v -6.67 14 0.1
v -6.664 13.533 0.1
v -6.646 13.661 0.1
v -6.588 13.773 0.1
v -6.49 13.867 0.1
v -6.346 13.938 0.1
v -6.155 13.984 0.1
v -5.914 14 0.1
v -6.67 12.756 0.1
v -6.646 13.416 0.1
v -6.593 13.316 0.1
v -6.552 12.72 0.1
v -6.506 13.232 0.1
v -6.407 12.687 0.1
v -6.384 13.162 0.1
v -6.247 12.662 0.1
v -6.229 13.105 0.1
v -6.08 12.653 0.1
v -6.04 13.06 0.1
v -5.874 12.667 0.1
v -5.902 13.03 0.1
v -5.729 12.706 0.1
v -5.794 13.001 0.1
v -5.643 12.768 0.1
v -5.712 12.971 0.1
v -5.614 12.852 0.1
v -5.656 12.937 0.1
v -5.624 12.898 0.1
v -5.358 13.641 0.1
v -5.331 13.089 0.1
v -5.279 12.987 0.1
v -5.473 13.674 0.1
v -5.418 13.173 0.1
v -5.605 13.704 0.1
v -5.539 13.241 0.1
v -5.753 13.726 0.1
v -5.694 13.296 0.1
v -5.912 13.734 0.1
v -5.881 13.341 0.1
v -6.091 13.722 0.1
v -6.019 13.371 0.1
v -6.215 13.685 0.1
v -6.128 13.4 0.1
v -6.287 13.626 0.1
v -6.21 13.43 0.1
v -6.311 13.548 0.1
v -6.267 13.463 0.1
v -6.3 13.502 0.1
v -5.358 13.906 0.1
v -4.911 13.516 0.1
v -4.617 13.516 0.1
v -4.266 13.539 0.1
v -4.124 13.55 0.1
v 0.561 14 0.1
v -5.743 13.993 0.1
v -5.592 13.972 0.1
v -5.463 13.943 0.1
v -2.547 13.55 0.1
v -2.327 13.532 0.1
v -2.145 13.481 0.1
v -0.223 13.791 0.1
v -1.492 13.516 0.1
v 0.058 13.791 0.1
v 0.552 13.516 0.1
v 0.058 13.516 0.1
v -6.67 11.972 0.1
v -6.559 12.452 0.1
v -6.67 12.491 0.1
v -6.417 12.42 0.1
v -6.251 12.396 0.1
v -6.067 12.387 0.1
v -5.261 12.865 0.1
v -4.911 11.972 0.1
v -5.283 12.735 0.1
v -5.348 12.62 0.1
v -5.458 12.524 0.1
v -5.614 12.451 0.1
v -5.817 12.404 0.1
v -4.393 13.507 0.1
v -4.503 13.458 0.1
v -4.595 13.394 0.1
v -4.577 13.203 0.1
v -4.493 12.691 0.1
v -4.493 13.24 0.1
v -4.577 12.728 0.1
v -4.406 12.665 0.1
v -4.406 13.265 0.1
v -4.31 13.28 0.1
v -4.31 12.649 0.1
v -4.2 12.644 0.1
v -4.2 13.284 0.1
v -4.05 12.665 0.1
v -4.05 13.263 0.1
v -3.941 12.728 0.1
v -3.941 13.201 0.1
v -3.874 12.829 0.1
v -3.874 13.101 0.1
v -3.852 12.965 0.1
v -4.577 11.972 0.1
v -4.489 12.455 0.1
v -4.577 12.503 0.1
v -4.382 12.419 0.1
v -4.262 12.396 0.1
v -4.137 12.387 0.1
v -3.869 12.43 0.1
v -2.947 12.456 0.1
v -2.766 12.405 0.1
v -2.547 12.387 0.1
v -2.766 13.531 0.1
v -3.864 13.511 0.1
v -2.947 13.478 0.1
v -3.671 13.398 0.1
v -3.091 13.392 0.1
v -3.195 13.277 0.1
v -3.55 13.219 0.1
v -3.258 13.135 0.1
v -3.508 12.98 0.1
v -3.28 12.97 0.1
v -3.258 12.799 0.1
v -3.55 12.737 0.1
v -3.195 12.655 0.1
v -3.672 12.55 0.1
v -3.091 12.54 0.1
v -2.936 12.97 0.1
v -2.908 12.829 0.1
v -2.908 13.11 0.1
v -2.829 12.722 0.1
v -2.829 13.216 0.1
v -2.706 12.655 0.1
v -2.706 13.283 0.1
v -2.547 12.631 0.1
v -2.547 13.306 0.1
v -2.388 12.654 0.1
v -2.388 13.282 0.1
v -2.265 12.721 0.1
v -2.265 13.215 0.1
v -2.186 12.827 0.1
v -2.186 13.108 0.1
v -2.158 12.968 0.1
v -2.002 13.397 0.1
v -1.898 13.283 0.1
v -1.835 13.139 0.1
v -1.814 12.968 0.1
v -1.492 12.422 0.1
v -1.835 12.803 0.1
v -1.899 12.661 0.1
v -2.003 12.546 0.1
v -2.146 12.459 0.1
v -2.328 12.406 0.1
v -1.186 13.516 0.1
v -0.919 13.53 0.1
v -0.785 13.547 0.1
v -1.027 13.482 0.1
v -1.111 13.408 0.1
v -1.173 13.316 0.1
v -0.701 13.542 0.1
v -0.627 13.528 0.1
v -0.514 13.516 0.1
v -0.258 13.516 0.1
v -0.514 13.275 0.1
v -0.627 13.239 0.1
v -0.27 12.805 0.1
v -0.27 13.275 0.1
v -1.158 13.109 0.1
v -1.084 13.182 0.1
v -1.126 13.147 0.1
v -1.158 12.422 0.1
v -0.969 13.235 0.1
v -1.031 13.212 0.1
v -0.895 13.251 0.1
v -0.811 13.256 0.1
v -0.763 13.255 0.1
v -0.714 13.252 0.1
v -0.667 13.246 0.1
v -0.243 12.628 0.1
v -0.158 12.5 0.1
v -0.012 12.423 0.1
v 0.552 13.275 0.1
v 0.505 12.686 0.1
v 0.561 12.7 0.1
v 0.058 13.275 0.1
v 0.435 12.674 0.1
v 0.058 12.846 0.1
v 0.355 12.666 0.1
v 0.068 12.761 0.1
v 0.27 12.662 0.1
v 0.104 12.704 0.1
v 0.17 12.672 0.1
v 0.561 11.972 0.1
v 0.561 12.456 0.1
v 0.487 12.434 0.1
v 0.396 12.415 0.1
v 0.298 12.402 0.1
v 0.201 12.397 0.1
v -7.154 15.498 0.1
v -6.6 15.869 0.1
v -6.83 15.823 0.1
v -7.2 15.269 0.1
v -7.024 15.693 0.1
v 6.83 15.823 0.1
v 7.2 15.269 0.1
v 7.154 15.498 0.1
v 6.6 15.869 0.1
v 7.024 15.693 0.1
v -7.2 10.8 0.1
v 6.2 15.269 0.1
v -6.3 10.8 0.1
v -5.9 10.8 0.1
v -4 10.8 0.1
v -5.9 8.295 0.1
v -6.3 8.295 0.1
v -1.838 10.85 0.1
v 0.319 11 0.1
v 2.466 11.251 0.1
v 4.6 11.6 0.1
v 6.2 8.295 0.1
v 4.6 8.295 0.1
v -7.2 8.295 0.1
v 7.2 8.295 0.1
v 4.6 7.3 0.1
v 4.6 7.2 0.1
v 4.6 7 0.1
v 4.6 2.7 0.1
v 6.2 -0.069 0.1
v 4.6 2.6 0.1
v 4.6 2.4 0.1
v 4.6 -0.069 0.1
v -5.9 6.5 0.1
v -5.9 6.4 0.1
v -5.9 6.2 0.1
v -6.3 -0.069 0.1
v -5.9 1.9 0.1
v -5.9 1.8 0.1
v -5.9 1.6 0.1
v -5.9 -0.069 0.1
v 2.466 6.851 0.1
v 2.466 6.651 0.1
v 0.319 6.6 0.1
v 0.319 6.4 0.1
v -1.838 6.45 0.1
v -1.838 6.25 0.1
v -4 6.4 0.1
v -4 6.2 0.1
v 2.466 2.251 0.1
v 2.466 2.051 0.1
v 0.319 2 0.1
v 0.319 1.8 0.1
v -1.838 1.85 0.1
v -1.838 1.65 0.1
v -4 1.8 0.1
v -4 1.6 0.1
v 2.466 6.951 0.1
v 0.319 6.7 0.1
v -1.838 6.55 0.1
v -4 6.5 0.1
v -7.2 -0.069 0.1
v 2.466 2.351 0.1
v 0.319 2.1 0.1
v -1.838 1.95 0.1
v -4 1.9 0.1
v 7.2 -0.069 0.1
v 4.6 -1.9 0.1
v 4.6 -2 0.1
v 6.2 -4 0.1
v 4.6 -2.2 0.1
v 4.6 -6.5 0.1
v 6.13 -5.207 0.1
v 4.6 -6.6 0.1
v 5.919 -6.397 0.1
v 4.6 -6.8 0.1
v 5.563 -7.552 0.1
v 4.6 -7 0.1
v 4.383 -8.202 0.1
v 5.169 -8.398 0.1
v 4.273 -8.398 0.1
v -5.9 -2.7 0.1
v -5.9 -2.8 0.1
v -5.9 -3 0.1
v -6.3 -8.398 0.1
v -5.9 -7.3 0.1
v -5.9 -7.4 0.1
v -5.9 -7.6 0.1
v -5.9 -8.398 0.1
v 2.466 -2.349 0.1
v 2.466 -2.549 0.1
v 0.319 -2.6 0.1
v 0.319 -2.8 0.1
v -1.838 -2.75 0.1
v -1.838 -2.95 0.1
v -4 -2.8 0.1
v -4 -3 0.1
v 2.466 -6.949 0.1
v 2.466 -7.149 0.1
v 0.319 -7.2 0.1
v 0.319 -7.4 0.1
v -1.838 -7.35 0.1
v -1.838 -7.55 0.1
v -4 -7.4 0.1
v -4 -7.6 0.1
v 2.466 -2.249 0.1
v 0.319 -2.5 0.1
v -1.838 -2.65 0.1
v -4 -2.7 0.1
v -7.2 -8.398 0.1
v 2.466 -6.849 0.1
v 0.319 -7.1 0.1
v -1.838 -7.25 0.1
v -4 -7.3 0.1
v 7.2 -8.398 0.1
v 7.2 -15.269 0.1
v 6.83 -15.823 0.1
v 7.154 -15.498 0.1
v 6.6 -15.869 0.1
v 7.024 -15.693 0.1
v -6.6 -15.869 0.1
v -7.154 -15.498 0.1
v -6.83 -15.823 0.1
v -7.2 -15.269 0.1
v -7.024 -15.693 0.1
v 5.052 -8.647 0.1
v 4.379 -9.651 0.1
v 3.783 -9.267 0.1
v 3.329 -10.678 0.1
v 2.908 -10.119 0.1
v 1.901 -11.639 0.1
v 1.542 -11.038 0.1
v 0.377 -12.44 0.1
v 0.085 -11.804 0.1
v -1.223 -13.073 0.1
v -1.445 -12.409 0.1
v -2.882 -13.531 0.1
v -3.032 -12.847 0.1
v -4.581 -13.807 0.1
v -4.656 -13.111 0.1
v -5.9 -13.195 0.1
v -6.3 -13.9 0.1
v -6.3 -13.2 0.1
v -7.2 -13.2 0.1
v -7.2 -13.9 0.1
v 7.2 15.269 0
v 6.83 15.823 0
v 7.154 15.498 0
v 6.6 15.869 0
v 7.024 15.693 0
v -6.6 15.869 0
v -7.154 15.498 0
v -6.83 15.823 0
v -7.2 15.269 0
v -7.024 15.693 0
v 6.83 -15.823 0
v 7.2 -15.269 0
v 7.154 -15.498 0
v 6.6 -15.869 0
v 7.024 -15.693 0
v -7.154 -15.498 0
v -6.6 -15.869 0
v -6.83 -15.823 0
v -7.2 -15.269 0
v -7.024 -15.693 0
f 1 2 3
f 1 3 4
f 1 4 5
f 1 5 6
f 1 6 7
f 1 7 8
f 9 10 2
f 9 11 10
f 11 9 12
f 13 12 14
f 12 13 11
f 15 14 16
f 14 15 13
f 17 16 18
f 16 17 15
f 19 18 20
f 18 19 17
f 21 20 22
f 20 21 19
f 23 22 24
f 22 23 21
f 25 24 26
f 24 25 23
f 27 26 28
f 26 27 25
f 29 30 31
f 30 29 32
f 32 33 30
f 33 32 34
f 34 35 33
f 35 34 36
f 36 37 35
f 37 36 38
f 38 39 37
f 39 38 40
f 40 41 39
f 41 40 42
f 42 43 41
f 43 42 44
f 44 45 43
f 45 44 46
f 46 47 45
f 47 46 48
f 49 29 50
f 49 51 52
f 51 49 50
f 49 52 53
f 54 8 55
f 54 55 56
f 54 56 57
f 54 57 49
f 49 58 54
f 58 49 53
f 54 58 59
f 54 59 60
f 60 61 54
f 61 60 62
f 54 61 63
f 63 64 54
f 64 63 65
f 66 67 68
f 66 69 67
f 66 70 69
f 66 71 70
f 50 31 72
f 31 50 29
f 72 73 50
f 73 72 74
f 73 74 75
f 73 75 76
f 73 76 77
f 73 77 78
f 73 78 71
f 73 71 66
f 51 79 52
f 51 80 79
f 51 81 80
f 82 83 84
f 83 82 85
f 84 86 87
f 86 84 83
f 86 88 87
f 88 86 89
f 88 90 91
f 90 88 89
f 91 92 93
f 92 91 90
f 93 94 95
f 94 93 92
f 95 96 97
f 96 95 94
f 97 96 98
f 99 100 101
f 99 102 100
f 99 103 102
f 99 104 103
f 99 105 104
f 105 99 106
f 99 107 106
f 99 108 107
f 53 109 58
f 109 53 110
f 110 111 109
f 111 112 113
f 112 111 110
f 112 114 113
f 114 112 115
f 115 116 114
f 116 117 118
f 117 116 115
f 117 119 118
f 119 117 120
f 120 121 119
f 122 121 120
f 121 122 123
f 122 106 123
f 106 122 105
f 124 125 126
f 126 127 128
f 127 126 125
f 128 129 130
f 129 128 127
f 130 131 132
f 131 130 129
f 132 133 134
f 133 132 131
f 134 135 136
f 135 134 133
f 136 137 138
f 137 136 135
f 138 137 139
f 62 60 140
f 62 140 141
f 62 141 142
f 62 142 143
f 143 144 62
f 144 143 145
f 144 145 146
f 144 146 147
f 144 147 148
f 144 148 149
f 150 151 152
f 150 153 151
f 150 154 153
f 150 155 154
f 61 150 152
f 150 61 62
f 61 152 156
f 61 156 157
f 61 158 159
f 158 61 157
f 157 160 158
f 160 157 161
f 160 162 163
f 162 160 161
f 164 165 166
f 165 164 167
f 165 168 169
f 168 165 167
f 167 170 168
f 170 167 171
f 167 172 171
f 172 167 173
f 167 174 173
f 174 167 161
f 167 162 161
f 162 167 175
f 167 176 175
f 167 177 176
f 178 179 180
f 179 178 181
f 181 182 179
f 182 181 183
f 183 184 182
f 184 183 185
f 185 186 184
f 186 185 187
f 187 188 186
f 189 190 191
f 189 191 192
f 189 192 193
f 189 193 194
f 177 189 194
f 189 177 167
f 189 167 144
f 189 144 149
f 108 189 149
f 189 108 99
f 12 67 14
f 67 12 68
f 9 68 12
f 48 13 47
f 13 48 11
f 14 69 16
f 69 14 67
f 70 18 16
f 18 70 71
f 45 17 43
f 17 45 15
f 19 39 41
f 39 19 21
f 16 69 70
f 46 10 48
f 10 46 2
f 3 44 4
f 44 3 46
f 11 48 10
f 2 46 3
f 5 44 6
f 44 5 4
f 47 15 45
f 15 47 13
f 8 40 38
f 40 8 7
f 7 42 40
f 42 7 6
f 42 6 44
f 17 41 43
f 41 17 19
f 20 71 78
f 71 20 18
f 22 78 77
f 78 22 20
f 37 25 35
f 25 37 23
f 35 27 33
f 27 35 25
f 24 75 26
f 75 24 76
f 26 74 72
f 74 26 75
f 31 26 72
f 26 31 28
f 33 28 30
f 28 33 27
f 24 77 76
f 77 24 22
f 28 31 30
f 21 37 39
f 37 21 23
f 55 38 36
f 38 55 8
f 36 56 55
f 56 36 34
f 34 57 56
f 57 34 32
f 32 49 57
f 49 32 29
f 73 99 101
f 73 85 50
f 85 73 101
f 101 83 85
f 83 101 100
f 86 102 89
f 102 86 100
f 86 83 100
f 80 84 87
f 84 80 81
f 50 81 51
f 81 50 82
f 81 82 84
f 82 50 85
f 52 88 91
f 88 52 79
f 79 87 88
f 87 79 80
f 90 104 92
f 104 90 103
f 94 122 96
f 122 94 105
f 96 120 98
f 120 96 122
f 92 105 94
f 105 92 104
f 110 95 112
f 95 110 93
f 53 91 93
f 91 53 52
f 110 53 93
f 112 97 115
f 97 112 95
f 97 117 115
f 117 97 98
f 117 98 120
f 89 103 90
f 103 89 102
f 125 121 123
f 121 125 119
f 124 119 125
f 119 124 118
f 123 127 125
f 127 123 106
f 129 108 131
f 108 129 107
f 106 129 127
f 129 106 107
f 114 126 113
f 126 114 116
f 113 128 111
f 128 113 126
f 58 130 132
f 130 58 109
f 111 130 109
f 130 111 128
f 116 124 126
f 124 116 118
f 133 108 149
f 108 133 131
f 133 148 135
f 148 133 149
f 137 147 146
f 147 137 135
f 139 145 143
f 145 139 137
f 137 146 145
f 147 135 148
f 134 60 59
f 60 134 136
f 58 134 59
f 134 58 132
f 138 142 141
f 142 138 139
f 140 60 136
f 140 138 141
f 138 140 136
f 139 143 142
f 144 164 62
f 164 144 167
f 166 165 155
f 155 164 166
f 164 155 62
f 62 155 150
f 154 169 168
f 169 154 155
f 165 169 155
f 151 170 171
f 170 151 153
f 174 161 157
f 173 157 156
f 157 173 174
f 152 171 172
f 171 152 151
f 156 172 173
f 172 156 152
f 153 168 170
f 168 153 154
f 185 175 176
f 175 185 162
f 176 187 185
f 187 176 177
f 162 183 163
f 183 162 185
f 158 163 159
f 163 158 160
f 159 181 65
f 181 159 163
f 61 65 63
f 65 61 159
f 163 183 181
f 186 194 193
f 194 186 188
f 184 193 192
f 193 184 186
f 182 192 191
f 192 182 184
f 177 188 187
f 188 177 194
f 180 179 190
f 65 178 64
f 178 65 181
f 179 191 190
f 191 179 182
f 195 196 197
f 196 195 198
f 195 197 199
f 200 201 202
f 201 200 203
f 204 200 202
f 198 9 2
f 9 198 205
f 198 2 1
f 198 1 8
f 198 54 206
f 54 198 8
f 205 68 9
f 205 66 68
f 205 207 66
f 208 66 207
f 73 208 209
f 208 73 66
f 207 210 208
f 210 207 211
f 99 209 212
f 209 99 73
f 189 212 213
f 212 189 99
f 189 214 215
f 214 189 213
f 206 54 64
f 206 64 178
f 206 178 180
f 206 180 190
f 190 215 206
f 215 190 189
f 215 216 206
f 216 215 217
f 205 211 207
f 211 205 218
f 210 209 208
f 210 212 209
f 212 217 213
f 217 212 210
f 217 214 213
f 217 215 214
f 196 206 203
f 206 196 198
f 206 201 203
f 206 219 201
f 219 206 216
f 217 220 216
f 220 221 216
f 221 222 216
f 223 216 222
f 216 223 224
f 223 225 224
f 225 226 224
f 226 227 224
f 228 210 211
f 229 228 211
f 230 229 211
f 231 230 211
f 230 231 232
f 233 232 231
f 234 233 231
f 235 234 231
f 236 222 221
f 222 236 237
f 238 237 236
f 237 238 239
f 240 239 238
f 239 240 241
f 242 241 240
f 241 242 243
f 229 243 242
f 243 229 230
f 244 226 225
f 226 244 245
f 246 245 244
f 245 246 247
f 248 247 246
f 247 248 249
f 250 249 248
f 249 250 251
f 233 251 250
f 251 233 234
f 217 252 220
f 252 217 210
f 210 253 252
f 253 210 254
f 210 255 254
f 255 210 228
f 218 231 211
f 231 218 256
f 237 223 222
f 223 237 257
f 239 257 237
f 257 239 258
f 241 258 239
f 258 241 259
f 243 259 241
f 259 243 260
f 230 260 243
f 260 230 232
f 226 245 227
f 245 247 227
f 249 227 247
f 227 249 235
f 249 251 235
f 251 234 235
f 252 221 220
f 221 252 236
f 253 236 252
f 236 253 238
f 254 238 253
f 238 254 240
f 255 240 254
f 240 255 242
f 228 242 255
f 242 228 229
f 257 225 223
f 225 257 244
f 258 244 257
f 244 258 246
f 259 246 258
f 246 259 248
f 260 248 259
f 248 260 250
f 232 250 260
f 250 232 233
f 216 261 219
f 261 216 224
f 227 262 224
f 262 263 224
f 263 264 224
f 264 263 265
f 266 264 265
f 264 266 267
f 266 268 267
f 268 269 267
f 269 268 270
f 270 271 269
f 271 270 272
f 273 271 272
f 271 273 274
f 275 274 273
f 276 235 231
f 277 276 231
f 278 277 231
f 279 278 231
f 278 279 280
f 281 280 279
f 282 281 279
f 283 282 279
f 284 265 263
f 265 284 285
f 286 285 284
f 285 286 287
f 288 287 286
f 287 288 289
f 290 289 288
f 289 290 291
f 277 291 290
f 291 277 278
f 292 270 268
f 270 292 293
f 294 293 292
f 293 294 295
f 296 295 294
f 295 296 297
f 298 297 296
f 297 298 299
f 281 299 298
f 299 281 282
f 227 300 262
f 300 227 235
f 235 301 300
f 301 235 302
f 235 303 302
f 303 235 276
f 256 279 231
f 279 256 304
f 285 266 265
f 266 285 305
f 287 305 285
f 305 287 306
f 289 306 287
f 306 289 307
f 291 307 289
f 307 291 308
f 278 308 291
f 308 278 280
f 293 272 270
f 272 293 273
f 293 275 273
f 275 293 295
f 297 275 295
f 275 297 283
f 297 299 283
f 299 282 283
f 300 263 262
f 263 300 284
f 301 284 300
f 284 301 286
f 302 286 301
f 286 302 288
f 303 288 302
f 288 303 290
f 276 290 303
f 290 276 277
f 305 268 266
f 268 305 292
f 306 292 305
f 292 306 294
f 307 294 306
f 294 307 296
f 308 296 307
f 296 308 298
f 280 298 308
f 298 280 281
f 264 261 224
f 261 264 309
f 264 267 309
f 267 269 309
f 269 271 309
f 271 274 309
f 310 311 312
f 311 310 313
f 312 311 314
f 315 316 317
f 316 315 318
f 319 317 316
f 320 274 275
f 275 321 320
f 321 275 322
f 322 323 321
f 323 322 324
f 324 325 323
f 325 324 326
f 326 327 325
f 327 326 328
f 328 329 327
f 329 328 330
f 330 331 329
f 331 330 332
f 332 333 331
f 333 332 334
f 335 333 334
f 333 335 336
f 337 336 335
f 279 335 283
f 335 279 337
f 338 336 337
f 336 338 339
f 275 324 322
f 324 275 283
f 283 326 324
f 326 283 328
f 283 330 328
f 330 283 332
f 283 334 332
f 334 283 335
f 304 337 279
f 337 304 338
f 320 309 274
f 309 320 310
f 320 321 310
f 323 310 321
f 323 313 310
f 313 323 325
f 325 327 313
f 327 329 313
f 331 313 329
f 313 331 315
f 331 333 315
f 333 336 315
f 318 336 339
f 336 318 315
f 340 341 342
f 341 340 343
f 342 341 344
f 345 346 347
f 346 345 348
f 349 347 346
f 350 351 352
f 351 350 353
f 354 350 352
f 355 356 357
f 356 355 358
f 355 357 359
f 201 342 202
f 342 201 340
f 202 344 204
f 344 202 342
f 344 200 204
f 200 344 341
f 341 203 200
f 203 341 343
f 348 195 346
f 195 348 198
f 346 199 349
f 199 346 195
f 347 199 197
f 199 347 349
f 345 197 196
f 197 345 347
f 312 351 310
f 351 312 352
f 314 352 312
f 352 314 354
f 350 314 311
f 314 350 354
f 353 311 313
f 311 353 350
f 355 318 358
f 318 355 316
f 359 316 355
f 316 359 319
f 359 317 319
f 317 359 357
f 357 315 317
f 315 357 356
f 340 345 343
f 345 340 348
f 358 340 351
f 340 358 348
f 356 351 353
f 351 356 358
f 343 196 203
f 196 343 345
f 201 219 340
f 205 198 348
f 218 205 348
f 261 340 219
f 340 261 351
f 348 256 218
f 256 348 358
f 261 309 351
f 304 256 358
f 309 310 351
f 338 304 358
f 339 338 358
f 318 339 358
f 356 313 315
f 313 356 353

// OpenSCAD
use <../lib.scad>
use <s/6142271as02.scad>
use <s/6142271as03.scad>
use <s/6142271as04.scad>
use <s/6142271as05.scad>
use <s/6142271ds01.scad>
function ldraw_lib__6142271d() = [
// 0 Sticker  1.8 x  4 with Dark Grey Rear Windshield with Black Air Vents and White "Sport" Text on White Face
// 0 Name: 6142271d.dat
// 0 Author: Massimo Maso [Sirio]
// 0 !LDRAW_ORG Part UPDATE 2025-02
// 0 !LICENSE Licensed under CC BY 4.0 : see CAreadme.txt
// 
// 0 BFC CERTIFY CCW
  [0,"BFC","CERTIFY"],
  [0,"BFC","CCW"],
// 
// 0 !KEYWORDS Audi, Bricklink 75873stk01a, Brickowl 427960, LMS, R8
// 0 !KEYWORDS Rebrickable 24755, Set 75873, Speed Champions, Ultra
// 
// 0 !HISTORY 2025-02-27 [OrionP] Official Update 2025-02
// 
// 
// 1 16 0 0 20.7523 1 0 0 0 1 0 0 0 1 s\6142271ds01.dat
  [1,16,0,0,20.7523,1,0,0,0,1,0,0,0,1, ldraw_lib__s__6142271ds01()],
// 1 16 0 0 20.7217 -1 0 0 0 1 0 0 0 1 s\6142271as02.dat
  [1,16,0,0,20.7217,-1,0,0,0,1,0,0,0,1, ldraw_lib__s__6142271as02()],
// 1 16 0 0 -20.9783 -1 0 0 0 1 0 0 0 1 s\6142271as03.dat
  [1,16,0,0,-20.9783,-1,0,0,0,1,0,0,0,1, ldraw_lib__s__6142271as03()],
// 1 16 0 0 -21.0097 -1 0 0 0 1 0 0 0 1 s\6142271as04.dat
  [1,16,0,0,-21.0097,-1,0,0,0,1,0,0,0,1, ldraw_lib__s__6142271as04()],
// 1 16 0 0 0 -1 0 0 0 1 0 0 0 1 s\6142271as05.dat
  [1,16,0,0,0,-1,0,0,0,1,0,0,0,1, ldraw_lib__s__6142271as05()],
];
module ldraw_lib__6142271d(step=0, col=false, unit=2/5, alt=false, line=0.2, solid=!$preview)
    makepoly(ldraw_lib__6142271d(), step=step, col=col, unit=unit, alt=alt, line=line, solid=solid);
ldraw_lib__6142271d(line=0.2);
